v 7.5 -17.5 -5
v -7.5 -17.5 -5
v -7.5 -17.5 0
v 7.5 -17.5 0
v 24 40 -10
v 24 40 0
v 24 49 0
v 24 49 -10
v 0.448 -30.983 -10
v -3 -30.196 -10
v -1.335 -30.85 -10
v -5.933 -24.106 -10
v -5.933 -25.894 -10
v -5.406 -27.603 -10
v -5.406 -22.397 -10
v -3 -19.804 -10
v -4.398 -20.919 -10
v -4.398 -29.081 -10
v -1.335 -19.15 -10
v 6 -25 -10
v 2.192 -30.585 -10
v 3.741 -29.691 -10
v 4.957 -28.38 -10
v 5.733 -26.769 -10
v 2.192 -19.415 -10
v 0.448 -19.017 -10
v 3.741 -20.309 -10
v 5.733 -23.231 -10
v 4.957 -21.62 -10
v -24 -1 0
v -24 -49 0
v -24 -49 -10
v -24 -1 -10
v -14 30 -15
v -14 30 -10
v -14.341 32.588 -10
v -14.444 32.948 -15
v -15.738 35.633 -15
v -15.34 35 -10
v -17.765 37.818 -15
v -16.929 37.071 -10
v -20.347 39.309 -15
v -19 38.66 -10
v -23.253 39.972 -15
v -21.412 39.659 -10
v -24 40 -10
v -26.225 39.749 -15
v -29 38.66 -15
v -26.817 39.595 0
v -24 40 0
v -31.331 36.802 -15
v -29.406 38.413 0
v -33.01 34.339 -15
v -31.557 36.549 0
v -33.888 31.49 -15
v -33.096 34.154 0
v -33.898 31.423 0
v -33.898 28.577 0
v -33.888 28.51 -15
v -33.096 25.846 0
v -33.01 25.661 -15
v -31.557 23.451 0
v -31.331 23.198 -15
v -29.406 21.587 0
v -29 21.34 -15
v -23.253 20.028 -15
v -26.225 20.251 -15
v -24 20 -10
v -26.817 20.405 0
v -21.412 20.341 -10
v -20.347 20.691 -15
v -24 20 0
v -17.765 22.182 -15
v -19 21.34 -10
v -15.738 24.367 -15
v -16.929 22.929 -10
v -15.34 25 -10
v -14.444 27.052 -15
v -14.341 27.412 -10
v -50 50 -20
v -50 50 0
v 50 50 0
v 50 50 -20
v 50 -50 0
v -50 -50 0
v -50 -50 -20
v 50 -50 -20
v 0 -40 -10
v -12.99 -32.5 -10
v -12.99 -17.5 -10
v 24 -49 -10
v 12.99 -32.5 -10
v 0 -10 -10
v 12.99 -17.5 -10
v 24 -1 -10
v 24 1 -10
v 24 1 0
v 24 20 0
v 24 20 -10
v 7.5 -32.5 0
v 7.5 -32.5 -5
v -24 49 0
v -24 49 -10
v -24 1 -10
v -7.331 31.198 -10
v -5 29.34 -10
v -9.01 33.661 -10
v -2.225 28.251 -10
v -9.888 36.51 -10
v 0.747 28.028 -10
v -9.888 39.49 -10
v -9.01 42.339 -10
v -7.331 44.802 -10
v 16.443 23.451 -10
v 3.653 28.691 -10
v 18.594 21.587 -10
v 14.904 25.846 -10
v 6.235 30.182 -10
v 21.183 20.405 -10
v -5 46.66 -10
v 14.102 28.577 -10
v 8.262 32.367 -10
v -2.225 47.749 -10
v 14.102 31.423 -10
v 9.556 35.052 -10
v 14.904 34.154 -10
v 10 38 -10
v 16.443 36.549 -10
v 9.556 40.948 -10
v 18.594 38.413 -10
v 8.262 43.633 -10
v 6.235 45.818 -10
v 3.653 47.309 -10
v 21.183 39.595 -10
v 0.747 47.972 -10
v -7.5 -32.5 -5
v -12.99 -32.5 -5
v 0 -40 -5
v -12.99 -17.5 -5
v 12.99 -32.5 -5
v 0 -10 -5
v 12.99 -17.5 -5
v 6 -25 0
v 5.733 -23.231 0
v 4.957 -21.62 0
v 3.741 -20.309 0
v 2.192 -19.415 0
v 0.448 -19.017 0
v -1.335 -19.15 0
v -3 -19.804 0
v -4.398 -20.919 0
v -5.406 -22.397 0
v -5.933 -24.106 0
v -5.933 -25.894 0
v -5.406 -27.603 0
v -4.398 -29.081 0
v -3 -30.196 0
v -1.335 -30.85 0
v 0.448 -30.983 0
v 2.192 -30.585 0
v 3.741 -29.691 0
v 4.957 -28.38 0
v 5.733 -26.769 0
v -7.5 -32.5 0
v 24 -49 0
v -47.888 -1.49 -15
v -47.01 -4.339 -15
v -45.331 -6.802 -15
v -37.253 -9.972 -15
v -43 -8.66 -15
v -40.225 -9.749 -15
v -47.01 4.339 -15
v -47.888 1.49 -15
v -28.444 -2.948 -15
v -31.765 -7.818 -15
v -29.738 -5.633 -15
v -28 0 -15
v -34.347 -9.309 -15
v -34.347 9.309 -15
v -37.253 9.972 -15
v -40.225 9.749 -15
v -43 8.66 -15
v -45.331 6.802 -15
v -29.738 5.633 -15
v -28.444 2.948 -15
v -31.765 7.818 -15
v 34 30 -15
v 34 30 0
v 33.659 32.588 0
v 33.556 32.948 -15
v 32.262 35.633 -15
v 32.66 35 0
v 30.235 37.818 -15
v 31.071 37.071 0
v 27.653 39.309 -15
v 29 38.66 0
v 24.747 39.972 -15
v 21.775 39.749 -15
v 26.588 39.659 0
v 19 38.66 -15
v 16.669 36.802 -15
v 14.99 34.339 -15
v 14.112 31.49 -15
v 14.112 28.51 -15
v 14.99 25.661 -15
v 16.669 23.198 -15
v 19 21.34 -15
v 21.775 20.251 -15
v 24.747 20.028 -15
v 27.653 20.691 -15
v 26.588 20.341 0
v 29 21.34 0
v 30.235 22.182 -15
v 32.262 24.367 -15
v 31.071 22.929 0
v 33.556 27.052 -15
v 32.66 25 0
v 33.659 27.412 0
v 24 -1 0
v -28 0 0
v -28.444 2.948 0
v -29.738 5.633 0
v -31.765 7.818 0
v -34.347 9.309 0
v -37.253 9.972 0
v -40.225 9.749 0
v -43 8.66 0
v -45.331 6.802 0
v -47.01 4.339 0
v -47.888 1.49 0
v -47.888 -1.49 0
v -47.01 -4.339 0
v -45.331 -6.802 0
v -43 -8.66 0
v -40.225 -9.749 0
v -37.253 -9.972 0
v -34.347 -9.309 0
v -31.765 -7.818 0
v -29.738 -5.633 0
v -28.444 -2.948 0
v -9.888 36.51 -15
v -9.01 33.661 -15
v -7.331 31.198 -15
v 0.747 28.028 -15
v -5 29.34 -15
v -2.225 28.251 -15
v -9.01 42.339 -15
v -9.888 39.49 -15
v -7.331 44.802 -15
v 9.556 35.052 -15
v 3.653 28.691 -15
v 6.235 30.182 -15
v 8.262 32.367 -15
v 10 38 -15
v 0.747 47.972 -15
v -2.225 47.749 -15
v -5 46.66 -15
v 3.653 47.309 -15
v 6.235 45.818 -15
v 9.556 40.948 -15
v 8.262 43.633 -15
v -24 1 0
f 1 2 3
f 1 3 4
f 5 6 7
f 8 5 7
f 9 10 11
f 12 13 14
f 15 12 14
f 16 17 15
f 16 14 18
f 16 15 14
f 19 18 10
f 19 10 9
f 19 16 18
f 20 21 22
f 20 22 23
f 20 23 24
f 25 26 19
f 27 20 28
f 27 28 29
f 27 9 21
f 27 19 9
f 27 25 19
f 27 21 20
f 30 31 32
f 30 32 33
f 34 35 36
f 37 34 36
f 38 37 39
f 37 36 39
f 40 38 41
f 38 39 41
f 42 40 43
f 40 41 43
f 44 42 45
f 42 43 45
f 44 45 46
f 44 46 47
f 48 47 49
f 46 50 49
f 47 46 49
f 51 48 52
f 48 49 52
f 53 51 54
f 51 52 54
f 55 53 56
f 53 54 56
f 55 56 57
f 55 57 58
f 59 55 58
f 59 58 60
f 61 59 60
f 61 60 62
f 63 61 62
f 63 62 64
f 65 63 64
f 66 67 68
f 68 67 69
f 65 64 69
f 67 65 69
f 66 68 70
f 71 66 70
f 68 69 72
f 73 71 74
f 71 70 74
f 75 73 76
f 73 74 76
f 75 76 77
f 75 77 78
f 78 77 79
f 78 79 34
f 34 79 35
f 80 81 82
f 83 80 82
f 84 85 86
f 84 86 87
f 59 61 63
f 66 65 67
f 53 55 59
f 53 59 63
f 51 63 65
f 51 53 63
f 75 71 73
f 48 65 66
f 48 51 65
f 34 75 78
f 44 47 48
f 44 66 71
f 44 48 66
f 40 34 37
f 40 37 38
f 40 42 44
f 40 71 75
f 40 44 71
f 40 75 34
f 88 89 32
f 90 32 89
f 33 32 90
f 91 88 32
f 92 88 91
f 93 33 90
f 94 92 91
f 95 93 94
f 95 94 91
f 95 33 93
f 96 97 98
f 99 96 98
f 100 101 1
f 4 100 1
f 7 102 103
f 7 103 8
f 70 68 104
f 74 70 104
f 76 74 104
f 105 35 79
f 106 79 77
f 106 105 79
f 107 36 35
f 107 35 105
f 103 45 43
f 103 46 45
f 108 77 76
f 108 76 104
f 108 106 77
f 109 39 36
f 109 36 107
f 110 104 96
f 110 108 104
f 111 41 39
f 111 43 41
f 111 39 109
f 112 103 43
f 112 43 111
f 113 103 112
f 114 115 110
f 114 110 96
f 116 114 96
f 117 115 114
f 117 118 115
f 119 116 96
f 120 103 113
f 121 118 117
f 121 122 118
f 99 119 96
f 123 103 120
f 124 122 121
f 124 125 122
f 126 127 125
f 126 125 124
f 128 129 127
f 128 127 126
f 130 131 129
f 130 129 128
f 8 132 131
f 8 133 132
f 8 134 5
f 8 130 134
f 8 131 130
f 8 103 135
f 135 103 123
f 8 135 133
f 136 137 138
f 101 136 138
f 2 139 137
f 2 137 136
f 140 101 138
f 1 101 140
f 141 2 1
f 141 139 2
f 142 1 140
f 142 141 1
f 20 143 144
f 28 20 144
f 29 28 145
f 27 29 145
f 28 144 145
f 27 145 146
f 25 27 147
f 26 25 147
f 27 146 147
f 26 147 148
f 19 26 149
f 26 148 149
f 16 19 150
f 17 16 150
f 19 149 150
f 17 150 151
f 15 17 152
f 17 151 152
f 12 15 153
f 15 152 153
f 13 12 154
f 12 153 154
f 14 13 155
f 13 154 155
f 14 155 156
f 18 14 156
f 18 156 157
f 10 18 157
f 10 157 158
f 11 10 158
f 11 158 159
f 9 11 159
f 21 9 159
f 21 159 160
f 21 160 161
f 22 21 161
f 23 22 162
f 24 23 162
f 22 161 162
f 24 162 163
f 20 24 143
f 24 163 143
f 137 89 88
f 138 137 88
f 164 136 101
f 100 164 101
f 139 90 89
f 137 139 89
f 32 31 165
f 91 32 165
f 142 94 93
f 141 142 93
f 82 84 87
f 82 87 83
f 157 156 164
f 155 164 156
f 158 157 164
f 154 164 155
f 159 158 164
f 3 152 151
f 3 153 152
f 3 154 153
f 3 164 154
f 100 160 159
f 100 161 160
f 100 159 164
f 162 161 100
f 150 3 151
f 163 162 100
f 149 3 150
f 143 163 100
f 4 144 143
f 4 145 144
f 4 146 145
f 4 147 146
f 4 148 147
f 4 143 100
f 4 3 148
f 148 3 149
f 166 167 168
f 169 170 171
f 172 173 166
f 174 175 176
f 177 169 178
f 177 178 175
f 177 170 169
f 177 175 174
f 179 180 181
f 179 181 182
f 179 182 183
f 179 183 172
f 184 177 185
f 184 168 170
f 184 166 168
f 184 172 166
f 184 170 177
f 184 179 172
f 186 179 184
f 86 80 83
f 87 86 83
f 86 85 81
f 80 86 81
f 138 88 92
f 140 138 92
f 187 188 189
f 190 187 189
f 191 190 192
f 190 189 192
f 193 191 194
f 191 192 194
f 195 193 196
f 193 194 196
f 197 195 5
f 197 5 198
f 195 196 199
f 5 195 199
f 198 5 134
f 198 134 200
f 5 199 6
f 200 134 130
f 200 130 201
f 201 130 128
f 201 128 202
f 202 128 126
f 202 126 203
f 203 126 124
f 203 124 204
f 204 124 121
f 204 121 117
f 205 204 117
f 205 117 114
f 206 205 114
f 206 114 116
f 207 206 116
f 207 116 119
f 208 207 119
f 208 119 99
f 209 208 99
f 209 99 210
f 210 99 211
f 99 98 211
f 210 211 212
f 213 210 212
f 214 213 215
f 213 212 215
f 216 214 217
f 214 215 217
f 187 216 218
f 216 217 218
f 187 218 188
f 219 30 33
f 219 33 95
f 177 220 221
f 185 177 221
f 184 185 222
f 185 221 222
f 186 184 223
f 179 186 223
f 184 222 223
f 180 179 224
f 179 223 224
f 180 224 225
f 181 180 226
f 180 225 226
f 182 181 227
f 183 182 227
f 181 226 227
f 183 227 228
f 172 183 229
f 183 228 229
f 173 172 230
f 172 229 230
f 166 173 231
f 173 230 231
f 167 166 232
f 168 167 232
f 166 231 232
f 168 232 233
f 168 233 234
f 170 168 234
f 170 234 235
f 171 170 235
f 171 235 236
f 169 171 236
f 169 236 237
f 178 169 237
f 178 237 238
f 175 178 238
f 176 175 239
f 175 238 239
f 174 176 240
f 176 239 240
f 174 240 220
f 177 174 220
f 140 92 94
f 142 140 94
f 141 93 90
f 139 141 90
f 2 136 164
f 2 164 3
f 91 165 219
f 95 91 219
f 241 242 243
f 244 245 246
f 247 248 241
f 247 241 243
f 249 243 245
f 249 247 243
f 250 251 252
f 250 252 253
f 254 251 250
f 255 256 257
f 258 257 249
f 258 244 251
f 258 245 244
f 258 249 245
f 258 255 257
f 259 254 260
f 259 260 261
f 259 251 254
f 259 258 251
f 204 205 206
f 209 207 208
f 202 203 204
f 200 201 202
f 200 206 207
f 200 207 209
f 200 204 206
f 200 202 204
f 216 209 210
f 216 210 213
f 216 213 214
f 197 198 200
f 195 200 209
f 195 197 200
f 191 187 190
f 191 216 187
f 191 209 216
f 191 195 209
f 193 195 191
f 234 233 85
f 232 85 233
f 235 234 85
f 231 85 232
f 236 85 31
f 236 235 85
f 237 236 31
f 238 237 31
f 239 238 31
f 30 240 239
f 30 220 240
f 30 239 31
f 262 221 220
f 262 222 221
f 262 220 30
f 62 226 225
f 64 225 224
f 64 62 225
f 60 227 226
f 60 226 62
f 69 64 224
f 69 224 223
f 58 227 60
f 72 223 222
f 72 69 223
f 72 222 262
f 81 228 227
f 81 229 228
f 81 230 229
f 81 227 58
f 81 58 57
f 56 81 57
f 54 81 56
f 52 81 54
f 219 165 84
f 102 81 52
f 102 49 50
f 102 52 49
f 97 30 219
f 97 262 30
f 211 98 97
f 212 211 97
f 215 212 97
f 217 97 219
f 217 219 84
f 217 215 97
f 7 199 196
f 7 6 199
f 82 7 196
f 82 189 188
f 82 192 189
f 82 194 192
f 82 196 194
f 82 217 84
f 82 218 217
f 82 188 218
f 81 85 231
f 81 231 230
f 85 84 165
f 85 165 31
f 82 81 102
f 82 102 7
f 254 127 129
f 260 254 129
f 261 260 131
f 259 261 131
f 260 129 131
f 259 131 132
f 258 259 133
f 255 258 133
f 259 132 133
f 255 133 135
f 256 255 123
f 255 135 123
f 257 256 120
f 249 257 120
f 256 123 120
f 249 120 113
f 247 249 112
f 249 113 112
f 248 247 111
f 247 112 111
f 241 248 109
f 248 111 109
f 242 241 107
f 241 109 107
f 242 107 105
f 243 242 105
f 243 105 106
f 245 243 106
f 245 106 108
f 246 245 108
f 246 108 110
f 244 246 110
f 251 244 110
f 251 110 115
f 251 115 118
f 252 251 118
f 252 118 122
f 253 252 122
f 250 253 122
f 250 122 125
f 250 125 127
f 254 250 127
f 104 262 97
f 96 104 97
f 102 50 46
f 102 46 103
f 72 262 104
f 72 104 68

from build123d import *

# Parameters (mm, degrees)
SKETCH_W        = 100
SKETCH_H        = 100
PAD_DEPTH       = 20
SKETCH001_W     = 48
SKETCH001_H     = 48
POCKET_DEPTH    = 10
SKETCH002_R     = 10
POCKET001_DEPTH = 15
PAD001_DEPTH    = 5
SKETCH004_W     = 15
SKETCH004_H     = 15
PAD002_DEPTH    = 5
SKETCH005_R     = 6
POCKET002_DEPTH = 10


with BuildPart() as part:
    # Sketch → Pad (new body)
    with BuildSketch(Plane.XY):
        Rectangle(SKETCH_W, SKETCH_H)
    extrude(amount=-PAD_DEPTH)

    # Sketch001 (on Face5 of Pad) → Pocket (cut)
    with BuildSketch(Plane.XY):
        with Locations((0, 25)):
            Rectangle(SKETCH001_W, SKETCH001_H)
        with Locations((0, -25)):
            Rectangle(SKETCH001_W, SKETCH001_H)
    extrude(amount=-POCKET_DEPTH, mode=Mode.SUBTRACT)

    # Sketch002 (on Face4 of Pocket) → Pocket001 (cut)
    with BuildSketch(Plane.XY):
        with Locations((-24, 30)):
            Circle(SKETCH002_R)
        with Locations((-38, 0)):
            Circle(SKETCH002_R)
        with Locations((0, 38)):
            Circle(SKETCH002_R)
        with Locations((24, 30)):
            Circle(SKETCH002_R)
    extrude(amount=-POCKET001_DEPTH, mode=Mode.SUBTRACT)

    # Sketch003 → Pad001 (join)
    with BuildSketch(Plane.XY.offset(-10)):
        Polygon((12.990381, -32.5), (12.990381, -17.5), (0, -10), (-12.990381, -17.5), (-12.990381, -32.5), (0, -40), align=None)
    extrude(amount=PAD001_DEPTH)

    # Sketch004 (on Face33 of Pad001) → Pad002 (join)
    with BuildSketch(Plane.XY.offset(-5)):
        with Locations((0, -25)):
            Rectangle(SKETCH004_W, SKETCH004_H)
    extrude(amount=PAD002_DEPTH)

    # Sketch005 (on Face38 of Pad002) → Pocket002 (cut)
    with BuildSketch(Plane.XY):
        with Locations((0, -25)):
            Circle(SKETCH005_R)
    extrude(amount=-POCKET002_DEPTH, mode=Mode.SUBTRACT)


solid = part.part
